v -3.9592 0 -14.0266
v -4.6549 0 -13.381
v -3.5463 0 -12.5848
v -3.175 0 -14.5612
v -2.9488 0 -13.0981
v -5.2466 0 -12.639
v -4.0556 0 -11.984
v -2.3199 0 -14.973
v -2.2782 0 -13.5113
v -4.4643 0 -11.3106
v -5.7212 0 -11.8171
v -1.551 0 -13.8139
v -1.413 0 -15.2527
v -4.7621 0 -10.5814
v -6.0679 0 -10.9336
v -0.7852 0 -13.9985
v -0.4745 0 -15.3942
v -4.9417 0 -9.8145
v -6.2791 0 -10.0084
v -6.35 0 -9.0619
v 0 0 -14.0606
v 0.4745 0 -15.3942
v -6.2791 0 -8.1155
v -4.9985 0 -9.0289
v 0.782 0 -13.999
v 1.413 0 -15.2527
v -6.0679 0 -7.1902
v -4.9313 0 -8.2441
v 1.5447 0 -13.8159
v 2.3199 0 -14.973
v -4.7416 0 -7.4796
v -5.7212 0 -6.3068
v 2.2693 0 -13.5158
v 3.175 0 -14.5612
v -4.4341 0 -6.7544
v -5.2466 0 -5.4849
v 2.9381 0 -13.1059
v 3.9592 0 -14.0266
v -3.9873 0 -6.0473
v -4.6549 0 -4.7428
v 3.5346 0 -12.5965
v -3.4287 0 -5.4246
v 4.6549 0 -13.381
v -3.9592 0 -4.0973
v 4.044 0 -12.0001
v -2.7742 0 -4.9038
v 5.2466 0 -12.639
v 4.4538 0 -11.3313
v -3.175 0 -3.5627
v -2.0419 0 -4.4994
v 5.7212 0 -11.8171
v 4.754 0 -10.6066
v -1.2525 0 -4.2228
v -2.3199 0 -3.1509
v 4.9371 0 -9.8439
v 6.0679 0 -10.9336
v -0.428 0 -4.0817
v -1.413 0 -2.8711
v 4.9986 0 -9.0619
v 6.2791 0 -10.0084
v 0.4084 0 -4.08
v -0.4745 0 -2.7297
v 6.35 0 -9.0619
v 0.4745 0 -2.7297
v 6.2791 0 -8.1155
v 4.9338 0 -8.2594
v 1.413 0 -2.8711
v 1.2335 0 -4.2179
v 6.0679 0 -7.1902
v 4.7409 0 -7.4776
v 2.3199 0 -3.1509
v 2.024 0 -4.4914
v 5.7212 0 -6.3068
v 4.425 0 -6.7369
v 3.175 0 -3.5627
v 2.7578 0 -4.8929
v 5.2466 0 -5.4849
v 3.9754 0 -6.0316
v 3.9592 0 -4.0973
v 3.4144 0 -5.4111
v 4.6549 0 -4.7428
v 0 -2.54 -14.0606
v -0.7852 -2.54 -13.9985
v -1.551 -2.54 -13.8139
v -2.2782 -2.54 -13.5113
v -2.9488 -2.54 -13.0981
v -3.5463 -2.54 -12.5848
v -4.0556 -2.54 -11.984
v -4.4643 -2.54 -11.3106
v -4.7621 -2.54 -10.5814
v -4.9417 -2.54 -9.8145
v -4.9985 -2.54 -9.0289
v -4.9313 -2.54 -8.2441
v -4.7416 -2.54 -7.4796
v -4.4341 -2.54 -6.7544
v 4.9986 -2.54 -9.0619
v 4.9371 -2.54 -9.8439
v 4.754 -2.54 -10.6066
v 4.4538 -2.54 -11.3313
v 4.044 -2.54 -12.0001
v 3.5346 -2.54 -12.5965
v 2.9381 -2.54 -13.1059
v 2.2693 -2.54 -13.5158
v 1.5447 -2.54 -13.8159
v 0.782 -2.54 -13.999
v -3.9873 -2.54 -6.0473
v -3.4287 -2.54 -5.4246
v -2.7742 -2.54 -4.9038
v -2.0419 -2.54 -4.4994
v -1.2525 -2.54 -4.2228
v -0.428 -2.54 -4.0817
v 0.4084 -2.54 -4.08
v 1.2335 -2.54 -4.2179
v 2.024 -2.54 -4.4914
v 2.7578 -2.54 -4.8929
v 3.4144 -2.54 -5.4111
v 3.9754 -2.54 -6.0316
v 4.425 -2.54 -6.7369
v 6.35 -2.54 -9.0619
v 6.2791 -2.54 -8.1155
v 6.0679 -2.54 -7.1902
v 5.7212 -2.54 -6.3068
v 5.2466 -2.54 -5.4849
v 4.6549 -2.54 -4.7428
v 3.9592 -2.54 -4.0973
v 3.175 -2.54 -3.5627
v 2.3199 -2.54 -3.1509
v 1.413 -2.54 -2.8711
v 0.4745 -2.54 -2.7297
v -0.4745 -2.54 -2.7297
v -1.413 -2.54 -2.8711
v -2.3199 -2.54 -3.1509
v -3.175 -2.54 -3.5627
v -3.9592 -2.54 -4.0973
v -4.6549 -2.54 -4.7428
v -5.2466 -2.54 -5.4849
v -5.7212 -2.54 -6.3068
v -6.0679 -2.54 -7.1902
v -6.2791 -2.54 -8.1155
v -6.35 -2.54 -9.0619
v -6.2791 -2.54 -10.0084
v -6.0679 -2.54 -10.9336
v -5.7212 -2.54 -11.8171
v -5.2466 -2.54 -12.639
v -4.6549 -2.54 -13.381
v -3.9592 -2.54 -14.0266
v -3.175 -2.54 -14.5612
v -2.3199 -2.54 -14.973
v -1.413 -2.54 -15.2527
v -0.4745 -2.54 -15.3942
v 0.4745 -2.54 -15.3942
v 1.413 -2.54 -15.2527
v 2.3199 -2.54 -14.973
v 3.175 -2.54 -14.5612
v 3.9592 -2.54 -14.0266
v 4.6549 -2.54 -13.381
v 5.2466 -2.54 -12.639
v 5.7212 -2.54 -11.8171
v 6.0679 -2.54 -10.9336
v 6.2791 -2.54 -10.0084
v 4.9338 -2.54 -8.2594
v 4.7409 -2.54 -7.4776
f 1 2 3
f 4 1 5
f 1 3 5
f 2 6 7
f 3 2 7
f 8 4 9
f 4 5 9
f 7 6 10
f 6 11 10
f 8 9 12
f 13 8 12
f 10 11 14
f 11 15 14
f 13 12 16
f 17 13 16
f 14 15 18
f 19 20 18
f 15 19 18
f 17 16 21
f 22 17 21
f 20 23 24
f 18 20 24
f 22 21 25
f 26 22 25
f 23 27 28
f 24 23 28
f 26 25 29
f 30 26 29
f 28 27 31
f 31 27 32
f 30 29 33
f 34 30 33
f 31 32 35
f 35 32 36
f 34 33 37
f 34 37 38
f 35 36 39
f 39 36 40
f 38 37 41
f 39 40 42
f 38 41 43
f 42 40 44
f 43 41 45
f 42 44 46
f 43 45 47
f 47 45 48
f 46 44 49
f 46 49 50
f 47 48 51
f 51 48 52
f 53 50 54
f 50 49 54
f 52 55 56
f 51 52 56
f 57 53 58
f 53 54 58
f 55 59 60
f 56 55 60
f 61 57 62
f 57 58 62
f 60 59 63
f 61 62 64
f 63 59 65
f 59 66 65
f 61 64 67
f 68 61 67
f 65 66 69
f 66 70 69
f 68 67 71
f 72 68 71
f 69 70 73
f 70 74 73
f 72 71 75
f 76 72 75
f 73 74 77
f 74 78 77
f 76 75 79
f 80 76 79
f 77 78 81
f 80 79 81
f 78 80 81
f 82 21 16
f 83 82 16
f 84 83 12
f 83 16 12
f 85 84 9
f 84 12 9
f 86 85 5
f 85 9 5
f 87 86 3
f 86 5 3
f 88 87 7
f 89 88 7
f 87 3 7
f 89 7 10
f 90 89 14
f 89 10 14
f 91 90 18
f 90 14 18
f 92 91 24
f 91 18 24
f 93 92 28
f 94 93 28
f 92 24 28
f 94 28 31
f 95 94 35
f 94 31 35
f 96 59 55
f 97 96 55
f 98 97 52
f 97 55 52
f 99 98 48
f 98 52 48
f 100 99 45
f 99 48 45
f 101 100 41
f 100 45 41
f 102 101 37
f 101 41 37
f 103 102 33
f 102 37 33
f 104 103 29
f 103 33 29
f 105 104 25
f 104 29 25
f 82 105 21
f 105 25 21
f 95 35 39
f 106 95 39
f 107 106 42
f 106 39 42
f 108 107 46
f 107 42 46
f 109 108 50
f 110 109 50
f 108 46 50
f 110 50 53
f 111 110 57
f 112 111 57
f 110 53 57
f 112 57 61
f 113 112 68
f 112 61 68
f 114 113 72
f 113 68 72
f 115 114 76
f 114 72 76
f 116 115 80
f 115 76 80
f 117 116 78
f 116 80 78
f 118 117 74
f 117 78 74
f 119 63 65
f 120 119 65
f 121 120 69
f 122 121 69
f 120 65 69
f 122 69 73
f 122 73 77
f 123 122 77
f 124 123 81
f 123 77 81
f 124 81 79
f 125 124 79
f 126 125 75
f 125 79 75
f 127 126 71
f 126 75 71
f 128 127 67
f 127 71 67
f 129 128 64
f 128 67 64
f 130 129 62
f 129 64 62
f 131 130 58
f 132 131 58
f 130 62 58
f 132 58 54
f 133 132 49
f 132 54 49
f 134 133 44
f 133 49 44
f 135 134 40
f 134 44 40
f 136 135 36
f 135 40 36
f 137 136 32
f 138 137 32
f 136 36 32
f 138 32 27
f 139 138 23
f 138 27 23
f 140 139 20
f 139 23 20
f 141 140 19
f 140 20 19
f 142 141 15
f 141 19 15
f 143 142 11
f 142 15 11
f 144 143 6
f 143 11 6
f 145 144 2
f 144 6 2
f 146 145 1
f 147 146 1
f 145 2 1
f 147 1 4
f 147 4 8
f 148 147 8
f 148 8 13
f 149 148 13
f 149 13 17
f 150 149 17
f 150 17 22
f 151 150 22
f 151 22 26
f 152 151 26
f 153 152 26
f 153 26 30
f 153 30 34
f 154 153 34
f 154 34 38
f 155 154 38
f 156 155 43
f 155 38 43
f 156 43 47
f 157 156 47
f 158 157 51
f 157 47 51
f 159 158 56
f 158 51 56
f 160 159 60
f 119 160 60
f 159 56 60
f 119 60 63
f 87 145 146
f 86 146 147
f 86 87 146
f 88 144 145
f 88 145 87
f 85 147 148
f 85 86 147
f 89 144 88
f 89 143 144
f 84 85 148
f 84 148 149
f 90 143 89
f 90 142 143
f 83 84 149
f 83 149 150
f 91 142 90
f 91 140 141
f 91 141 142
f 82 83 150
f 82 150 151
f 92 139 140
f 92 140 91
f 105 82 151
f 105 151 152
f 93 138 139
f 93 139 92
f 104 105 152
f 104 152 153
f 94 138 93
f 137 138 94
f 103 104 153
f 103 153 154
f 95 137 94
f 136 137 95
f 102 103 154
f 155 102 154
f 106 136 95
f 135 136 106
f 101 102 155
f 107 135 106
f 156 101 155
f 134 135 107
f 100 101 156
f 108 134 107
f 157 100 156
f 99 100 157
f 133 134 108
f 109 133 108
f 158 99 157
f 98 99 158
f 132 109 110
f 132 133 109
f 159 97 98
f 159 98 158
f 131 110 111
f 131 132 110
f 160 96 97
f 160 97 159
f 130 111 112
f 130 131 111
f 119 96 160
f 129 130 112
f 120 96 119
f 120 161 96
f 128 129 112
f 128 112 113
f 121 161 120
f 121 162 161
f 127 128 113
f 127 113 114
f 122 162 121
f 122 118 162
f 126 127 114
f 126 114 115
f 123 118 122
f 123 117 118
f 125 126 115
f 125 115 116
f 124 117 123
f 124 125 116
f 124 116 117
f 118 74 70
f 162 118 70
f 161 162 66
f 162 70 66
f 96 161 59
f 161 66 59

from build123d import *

# Parameters (mm, degrees)
F0_R     = 6.35
F1_DEPTH = 2.54


# Not quite as in the source:
# - a feature names something its author has since deleted; it is built from what else it names


with BuildPart() as f1:
    # F0 (on Front) → F1 (new body)
    with BuildSketch(Plane.XZ):
        with Locations((0, -9.0619377949)):
            Circle(F0_R)
        with BuildLine():
            ThreePointArc((4.4250278693, -6.7369416578), (4.8531244574, -7.864581673), (4.9986476853, -9.0619377949))
            ThreePointArc((4.9986476853, -9.0619377949), (3.534577675, -12.59651547), (0, -14.0605854803))
            ThreePointArc((0, -14.0605854803), (-4.2732397818, -11.6553718984), (-4.434145585, -6.7543781288))
            ThreePointArc((-4.434145585, -6.7543781288), (-0.0098382323, -4.0632997914), (4.4250278693, -6.7369416578))
        make_face(mode=Mode.SUBTRACT)
    extrude(amount=F1_DEPTH)


solid = f1.part
